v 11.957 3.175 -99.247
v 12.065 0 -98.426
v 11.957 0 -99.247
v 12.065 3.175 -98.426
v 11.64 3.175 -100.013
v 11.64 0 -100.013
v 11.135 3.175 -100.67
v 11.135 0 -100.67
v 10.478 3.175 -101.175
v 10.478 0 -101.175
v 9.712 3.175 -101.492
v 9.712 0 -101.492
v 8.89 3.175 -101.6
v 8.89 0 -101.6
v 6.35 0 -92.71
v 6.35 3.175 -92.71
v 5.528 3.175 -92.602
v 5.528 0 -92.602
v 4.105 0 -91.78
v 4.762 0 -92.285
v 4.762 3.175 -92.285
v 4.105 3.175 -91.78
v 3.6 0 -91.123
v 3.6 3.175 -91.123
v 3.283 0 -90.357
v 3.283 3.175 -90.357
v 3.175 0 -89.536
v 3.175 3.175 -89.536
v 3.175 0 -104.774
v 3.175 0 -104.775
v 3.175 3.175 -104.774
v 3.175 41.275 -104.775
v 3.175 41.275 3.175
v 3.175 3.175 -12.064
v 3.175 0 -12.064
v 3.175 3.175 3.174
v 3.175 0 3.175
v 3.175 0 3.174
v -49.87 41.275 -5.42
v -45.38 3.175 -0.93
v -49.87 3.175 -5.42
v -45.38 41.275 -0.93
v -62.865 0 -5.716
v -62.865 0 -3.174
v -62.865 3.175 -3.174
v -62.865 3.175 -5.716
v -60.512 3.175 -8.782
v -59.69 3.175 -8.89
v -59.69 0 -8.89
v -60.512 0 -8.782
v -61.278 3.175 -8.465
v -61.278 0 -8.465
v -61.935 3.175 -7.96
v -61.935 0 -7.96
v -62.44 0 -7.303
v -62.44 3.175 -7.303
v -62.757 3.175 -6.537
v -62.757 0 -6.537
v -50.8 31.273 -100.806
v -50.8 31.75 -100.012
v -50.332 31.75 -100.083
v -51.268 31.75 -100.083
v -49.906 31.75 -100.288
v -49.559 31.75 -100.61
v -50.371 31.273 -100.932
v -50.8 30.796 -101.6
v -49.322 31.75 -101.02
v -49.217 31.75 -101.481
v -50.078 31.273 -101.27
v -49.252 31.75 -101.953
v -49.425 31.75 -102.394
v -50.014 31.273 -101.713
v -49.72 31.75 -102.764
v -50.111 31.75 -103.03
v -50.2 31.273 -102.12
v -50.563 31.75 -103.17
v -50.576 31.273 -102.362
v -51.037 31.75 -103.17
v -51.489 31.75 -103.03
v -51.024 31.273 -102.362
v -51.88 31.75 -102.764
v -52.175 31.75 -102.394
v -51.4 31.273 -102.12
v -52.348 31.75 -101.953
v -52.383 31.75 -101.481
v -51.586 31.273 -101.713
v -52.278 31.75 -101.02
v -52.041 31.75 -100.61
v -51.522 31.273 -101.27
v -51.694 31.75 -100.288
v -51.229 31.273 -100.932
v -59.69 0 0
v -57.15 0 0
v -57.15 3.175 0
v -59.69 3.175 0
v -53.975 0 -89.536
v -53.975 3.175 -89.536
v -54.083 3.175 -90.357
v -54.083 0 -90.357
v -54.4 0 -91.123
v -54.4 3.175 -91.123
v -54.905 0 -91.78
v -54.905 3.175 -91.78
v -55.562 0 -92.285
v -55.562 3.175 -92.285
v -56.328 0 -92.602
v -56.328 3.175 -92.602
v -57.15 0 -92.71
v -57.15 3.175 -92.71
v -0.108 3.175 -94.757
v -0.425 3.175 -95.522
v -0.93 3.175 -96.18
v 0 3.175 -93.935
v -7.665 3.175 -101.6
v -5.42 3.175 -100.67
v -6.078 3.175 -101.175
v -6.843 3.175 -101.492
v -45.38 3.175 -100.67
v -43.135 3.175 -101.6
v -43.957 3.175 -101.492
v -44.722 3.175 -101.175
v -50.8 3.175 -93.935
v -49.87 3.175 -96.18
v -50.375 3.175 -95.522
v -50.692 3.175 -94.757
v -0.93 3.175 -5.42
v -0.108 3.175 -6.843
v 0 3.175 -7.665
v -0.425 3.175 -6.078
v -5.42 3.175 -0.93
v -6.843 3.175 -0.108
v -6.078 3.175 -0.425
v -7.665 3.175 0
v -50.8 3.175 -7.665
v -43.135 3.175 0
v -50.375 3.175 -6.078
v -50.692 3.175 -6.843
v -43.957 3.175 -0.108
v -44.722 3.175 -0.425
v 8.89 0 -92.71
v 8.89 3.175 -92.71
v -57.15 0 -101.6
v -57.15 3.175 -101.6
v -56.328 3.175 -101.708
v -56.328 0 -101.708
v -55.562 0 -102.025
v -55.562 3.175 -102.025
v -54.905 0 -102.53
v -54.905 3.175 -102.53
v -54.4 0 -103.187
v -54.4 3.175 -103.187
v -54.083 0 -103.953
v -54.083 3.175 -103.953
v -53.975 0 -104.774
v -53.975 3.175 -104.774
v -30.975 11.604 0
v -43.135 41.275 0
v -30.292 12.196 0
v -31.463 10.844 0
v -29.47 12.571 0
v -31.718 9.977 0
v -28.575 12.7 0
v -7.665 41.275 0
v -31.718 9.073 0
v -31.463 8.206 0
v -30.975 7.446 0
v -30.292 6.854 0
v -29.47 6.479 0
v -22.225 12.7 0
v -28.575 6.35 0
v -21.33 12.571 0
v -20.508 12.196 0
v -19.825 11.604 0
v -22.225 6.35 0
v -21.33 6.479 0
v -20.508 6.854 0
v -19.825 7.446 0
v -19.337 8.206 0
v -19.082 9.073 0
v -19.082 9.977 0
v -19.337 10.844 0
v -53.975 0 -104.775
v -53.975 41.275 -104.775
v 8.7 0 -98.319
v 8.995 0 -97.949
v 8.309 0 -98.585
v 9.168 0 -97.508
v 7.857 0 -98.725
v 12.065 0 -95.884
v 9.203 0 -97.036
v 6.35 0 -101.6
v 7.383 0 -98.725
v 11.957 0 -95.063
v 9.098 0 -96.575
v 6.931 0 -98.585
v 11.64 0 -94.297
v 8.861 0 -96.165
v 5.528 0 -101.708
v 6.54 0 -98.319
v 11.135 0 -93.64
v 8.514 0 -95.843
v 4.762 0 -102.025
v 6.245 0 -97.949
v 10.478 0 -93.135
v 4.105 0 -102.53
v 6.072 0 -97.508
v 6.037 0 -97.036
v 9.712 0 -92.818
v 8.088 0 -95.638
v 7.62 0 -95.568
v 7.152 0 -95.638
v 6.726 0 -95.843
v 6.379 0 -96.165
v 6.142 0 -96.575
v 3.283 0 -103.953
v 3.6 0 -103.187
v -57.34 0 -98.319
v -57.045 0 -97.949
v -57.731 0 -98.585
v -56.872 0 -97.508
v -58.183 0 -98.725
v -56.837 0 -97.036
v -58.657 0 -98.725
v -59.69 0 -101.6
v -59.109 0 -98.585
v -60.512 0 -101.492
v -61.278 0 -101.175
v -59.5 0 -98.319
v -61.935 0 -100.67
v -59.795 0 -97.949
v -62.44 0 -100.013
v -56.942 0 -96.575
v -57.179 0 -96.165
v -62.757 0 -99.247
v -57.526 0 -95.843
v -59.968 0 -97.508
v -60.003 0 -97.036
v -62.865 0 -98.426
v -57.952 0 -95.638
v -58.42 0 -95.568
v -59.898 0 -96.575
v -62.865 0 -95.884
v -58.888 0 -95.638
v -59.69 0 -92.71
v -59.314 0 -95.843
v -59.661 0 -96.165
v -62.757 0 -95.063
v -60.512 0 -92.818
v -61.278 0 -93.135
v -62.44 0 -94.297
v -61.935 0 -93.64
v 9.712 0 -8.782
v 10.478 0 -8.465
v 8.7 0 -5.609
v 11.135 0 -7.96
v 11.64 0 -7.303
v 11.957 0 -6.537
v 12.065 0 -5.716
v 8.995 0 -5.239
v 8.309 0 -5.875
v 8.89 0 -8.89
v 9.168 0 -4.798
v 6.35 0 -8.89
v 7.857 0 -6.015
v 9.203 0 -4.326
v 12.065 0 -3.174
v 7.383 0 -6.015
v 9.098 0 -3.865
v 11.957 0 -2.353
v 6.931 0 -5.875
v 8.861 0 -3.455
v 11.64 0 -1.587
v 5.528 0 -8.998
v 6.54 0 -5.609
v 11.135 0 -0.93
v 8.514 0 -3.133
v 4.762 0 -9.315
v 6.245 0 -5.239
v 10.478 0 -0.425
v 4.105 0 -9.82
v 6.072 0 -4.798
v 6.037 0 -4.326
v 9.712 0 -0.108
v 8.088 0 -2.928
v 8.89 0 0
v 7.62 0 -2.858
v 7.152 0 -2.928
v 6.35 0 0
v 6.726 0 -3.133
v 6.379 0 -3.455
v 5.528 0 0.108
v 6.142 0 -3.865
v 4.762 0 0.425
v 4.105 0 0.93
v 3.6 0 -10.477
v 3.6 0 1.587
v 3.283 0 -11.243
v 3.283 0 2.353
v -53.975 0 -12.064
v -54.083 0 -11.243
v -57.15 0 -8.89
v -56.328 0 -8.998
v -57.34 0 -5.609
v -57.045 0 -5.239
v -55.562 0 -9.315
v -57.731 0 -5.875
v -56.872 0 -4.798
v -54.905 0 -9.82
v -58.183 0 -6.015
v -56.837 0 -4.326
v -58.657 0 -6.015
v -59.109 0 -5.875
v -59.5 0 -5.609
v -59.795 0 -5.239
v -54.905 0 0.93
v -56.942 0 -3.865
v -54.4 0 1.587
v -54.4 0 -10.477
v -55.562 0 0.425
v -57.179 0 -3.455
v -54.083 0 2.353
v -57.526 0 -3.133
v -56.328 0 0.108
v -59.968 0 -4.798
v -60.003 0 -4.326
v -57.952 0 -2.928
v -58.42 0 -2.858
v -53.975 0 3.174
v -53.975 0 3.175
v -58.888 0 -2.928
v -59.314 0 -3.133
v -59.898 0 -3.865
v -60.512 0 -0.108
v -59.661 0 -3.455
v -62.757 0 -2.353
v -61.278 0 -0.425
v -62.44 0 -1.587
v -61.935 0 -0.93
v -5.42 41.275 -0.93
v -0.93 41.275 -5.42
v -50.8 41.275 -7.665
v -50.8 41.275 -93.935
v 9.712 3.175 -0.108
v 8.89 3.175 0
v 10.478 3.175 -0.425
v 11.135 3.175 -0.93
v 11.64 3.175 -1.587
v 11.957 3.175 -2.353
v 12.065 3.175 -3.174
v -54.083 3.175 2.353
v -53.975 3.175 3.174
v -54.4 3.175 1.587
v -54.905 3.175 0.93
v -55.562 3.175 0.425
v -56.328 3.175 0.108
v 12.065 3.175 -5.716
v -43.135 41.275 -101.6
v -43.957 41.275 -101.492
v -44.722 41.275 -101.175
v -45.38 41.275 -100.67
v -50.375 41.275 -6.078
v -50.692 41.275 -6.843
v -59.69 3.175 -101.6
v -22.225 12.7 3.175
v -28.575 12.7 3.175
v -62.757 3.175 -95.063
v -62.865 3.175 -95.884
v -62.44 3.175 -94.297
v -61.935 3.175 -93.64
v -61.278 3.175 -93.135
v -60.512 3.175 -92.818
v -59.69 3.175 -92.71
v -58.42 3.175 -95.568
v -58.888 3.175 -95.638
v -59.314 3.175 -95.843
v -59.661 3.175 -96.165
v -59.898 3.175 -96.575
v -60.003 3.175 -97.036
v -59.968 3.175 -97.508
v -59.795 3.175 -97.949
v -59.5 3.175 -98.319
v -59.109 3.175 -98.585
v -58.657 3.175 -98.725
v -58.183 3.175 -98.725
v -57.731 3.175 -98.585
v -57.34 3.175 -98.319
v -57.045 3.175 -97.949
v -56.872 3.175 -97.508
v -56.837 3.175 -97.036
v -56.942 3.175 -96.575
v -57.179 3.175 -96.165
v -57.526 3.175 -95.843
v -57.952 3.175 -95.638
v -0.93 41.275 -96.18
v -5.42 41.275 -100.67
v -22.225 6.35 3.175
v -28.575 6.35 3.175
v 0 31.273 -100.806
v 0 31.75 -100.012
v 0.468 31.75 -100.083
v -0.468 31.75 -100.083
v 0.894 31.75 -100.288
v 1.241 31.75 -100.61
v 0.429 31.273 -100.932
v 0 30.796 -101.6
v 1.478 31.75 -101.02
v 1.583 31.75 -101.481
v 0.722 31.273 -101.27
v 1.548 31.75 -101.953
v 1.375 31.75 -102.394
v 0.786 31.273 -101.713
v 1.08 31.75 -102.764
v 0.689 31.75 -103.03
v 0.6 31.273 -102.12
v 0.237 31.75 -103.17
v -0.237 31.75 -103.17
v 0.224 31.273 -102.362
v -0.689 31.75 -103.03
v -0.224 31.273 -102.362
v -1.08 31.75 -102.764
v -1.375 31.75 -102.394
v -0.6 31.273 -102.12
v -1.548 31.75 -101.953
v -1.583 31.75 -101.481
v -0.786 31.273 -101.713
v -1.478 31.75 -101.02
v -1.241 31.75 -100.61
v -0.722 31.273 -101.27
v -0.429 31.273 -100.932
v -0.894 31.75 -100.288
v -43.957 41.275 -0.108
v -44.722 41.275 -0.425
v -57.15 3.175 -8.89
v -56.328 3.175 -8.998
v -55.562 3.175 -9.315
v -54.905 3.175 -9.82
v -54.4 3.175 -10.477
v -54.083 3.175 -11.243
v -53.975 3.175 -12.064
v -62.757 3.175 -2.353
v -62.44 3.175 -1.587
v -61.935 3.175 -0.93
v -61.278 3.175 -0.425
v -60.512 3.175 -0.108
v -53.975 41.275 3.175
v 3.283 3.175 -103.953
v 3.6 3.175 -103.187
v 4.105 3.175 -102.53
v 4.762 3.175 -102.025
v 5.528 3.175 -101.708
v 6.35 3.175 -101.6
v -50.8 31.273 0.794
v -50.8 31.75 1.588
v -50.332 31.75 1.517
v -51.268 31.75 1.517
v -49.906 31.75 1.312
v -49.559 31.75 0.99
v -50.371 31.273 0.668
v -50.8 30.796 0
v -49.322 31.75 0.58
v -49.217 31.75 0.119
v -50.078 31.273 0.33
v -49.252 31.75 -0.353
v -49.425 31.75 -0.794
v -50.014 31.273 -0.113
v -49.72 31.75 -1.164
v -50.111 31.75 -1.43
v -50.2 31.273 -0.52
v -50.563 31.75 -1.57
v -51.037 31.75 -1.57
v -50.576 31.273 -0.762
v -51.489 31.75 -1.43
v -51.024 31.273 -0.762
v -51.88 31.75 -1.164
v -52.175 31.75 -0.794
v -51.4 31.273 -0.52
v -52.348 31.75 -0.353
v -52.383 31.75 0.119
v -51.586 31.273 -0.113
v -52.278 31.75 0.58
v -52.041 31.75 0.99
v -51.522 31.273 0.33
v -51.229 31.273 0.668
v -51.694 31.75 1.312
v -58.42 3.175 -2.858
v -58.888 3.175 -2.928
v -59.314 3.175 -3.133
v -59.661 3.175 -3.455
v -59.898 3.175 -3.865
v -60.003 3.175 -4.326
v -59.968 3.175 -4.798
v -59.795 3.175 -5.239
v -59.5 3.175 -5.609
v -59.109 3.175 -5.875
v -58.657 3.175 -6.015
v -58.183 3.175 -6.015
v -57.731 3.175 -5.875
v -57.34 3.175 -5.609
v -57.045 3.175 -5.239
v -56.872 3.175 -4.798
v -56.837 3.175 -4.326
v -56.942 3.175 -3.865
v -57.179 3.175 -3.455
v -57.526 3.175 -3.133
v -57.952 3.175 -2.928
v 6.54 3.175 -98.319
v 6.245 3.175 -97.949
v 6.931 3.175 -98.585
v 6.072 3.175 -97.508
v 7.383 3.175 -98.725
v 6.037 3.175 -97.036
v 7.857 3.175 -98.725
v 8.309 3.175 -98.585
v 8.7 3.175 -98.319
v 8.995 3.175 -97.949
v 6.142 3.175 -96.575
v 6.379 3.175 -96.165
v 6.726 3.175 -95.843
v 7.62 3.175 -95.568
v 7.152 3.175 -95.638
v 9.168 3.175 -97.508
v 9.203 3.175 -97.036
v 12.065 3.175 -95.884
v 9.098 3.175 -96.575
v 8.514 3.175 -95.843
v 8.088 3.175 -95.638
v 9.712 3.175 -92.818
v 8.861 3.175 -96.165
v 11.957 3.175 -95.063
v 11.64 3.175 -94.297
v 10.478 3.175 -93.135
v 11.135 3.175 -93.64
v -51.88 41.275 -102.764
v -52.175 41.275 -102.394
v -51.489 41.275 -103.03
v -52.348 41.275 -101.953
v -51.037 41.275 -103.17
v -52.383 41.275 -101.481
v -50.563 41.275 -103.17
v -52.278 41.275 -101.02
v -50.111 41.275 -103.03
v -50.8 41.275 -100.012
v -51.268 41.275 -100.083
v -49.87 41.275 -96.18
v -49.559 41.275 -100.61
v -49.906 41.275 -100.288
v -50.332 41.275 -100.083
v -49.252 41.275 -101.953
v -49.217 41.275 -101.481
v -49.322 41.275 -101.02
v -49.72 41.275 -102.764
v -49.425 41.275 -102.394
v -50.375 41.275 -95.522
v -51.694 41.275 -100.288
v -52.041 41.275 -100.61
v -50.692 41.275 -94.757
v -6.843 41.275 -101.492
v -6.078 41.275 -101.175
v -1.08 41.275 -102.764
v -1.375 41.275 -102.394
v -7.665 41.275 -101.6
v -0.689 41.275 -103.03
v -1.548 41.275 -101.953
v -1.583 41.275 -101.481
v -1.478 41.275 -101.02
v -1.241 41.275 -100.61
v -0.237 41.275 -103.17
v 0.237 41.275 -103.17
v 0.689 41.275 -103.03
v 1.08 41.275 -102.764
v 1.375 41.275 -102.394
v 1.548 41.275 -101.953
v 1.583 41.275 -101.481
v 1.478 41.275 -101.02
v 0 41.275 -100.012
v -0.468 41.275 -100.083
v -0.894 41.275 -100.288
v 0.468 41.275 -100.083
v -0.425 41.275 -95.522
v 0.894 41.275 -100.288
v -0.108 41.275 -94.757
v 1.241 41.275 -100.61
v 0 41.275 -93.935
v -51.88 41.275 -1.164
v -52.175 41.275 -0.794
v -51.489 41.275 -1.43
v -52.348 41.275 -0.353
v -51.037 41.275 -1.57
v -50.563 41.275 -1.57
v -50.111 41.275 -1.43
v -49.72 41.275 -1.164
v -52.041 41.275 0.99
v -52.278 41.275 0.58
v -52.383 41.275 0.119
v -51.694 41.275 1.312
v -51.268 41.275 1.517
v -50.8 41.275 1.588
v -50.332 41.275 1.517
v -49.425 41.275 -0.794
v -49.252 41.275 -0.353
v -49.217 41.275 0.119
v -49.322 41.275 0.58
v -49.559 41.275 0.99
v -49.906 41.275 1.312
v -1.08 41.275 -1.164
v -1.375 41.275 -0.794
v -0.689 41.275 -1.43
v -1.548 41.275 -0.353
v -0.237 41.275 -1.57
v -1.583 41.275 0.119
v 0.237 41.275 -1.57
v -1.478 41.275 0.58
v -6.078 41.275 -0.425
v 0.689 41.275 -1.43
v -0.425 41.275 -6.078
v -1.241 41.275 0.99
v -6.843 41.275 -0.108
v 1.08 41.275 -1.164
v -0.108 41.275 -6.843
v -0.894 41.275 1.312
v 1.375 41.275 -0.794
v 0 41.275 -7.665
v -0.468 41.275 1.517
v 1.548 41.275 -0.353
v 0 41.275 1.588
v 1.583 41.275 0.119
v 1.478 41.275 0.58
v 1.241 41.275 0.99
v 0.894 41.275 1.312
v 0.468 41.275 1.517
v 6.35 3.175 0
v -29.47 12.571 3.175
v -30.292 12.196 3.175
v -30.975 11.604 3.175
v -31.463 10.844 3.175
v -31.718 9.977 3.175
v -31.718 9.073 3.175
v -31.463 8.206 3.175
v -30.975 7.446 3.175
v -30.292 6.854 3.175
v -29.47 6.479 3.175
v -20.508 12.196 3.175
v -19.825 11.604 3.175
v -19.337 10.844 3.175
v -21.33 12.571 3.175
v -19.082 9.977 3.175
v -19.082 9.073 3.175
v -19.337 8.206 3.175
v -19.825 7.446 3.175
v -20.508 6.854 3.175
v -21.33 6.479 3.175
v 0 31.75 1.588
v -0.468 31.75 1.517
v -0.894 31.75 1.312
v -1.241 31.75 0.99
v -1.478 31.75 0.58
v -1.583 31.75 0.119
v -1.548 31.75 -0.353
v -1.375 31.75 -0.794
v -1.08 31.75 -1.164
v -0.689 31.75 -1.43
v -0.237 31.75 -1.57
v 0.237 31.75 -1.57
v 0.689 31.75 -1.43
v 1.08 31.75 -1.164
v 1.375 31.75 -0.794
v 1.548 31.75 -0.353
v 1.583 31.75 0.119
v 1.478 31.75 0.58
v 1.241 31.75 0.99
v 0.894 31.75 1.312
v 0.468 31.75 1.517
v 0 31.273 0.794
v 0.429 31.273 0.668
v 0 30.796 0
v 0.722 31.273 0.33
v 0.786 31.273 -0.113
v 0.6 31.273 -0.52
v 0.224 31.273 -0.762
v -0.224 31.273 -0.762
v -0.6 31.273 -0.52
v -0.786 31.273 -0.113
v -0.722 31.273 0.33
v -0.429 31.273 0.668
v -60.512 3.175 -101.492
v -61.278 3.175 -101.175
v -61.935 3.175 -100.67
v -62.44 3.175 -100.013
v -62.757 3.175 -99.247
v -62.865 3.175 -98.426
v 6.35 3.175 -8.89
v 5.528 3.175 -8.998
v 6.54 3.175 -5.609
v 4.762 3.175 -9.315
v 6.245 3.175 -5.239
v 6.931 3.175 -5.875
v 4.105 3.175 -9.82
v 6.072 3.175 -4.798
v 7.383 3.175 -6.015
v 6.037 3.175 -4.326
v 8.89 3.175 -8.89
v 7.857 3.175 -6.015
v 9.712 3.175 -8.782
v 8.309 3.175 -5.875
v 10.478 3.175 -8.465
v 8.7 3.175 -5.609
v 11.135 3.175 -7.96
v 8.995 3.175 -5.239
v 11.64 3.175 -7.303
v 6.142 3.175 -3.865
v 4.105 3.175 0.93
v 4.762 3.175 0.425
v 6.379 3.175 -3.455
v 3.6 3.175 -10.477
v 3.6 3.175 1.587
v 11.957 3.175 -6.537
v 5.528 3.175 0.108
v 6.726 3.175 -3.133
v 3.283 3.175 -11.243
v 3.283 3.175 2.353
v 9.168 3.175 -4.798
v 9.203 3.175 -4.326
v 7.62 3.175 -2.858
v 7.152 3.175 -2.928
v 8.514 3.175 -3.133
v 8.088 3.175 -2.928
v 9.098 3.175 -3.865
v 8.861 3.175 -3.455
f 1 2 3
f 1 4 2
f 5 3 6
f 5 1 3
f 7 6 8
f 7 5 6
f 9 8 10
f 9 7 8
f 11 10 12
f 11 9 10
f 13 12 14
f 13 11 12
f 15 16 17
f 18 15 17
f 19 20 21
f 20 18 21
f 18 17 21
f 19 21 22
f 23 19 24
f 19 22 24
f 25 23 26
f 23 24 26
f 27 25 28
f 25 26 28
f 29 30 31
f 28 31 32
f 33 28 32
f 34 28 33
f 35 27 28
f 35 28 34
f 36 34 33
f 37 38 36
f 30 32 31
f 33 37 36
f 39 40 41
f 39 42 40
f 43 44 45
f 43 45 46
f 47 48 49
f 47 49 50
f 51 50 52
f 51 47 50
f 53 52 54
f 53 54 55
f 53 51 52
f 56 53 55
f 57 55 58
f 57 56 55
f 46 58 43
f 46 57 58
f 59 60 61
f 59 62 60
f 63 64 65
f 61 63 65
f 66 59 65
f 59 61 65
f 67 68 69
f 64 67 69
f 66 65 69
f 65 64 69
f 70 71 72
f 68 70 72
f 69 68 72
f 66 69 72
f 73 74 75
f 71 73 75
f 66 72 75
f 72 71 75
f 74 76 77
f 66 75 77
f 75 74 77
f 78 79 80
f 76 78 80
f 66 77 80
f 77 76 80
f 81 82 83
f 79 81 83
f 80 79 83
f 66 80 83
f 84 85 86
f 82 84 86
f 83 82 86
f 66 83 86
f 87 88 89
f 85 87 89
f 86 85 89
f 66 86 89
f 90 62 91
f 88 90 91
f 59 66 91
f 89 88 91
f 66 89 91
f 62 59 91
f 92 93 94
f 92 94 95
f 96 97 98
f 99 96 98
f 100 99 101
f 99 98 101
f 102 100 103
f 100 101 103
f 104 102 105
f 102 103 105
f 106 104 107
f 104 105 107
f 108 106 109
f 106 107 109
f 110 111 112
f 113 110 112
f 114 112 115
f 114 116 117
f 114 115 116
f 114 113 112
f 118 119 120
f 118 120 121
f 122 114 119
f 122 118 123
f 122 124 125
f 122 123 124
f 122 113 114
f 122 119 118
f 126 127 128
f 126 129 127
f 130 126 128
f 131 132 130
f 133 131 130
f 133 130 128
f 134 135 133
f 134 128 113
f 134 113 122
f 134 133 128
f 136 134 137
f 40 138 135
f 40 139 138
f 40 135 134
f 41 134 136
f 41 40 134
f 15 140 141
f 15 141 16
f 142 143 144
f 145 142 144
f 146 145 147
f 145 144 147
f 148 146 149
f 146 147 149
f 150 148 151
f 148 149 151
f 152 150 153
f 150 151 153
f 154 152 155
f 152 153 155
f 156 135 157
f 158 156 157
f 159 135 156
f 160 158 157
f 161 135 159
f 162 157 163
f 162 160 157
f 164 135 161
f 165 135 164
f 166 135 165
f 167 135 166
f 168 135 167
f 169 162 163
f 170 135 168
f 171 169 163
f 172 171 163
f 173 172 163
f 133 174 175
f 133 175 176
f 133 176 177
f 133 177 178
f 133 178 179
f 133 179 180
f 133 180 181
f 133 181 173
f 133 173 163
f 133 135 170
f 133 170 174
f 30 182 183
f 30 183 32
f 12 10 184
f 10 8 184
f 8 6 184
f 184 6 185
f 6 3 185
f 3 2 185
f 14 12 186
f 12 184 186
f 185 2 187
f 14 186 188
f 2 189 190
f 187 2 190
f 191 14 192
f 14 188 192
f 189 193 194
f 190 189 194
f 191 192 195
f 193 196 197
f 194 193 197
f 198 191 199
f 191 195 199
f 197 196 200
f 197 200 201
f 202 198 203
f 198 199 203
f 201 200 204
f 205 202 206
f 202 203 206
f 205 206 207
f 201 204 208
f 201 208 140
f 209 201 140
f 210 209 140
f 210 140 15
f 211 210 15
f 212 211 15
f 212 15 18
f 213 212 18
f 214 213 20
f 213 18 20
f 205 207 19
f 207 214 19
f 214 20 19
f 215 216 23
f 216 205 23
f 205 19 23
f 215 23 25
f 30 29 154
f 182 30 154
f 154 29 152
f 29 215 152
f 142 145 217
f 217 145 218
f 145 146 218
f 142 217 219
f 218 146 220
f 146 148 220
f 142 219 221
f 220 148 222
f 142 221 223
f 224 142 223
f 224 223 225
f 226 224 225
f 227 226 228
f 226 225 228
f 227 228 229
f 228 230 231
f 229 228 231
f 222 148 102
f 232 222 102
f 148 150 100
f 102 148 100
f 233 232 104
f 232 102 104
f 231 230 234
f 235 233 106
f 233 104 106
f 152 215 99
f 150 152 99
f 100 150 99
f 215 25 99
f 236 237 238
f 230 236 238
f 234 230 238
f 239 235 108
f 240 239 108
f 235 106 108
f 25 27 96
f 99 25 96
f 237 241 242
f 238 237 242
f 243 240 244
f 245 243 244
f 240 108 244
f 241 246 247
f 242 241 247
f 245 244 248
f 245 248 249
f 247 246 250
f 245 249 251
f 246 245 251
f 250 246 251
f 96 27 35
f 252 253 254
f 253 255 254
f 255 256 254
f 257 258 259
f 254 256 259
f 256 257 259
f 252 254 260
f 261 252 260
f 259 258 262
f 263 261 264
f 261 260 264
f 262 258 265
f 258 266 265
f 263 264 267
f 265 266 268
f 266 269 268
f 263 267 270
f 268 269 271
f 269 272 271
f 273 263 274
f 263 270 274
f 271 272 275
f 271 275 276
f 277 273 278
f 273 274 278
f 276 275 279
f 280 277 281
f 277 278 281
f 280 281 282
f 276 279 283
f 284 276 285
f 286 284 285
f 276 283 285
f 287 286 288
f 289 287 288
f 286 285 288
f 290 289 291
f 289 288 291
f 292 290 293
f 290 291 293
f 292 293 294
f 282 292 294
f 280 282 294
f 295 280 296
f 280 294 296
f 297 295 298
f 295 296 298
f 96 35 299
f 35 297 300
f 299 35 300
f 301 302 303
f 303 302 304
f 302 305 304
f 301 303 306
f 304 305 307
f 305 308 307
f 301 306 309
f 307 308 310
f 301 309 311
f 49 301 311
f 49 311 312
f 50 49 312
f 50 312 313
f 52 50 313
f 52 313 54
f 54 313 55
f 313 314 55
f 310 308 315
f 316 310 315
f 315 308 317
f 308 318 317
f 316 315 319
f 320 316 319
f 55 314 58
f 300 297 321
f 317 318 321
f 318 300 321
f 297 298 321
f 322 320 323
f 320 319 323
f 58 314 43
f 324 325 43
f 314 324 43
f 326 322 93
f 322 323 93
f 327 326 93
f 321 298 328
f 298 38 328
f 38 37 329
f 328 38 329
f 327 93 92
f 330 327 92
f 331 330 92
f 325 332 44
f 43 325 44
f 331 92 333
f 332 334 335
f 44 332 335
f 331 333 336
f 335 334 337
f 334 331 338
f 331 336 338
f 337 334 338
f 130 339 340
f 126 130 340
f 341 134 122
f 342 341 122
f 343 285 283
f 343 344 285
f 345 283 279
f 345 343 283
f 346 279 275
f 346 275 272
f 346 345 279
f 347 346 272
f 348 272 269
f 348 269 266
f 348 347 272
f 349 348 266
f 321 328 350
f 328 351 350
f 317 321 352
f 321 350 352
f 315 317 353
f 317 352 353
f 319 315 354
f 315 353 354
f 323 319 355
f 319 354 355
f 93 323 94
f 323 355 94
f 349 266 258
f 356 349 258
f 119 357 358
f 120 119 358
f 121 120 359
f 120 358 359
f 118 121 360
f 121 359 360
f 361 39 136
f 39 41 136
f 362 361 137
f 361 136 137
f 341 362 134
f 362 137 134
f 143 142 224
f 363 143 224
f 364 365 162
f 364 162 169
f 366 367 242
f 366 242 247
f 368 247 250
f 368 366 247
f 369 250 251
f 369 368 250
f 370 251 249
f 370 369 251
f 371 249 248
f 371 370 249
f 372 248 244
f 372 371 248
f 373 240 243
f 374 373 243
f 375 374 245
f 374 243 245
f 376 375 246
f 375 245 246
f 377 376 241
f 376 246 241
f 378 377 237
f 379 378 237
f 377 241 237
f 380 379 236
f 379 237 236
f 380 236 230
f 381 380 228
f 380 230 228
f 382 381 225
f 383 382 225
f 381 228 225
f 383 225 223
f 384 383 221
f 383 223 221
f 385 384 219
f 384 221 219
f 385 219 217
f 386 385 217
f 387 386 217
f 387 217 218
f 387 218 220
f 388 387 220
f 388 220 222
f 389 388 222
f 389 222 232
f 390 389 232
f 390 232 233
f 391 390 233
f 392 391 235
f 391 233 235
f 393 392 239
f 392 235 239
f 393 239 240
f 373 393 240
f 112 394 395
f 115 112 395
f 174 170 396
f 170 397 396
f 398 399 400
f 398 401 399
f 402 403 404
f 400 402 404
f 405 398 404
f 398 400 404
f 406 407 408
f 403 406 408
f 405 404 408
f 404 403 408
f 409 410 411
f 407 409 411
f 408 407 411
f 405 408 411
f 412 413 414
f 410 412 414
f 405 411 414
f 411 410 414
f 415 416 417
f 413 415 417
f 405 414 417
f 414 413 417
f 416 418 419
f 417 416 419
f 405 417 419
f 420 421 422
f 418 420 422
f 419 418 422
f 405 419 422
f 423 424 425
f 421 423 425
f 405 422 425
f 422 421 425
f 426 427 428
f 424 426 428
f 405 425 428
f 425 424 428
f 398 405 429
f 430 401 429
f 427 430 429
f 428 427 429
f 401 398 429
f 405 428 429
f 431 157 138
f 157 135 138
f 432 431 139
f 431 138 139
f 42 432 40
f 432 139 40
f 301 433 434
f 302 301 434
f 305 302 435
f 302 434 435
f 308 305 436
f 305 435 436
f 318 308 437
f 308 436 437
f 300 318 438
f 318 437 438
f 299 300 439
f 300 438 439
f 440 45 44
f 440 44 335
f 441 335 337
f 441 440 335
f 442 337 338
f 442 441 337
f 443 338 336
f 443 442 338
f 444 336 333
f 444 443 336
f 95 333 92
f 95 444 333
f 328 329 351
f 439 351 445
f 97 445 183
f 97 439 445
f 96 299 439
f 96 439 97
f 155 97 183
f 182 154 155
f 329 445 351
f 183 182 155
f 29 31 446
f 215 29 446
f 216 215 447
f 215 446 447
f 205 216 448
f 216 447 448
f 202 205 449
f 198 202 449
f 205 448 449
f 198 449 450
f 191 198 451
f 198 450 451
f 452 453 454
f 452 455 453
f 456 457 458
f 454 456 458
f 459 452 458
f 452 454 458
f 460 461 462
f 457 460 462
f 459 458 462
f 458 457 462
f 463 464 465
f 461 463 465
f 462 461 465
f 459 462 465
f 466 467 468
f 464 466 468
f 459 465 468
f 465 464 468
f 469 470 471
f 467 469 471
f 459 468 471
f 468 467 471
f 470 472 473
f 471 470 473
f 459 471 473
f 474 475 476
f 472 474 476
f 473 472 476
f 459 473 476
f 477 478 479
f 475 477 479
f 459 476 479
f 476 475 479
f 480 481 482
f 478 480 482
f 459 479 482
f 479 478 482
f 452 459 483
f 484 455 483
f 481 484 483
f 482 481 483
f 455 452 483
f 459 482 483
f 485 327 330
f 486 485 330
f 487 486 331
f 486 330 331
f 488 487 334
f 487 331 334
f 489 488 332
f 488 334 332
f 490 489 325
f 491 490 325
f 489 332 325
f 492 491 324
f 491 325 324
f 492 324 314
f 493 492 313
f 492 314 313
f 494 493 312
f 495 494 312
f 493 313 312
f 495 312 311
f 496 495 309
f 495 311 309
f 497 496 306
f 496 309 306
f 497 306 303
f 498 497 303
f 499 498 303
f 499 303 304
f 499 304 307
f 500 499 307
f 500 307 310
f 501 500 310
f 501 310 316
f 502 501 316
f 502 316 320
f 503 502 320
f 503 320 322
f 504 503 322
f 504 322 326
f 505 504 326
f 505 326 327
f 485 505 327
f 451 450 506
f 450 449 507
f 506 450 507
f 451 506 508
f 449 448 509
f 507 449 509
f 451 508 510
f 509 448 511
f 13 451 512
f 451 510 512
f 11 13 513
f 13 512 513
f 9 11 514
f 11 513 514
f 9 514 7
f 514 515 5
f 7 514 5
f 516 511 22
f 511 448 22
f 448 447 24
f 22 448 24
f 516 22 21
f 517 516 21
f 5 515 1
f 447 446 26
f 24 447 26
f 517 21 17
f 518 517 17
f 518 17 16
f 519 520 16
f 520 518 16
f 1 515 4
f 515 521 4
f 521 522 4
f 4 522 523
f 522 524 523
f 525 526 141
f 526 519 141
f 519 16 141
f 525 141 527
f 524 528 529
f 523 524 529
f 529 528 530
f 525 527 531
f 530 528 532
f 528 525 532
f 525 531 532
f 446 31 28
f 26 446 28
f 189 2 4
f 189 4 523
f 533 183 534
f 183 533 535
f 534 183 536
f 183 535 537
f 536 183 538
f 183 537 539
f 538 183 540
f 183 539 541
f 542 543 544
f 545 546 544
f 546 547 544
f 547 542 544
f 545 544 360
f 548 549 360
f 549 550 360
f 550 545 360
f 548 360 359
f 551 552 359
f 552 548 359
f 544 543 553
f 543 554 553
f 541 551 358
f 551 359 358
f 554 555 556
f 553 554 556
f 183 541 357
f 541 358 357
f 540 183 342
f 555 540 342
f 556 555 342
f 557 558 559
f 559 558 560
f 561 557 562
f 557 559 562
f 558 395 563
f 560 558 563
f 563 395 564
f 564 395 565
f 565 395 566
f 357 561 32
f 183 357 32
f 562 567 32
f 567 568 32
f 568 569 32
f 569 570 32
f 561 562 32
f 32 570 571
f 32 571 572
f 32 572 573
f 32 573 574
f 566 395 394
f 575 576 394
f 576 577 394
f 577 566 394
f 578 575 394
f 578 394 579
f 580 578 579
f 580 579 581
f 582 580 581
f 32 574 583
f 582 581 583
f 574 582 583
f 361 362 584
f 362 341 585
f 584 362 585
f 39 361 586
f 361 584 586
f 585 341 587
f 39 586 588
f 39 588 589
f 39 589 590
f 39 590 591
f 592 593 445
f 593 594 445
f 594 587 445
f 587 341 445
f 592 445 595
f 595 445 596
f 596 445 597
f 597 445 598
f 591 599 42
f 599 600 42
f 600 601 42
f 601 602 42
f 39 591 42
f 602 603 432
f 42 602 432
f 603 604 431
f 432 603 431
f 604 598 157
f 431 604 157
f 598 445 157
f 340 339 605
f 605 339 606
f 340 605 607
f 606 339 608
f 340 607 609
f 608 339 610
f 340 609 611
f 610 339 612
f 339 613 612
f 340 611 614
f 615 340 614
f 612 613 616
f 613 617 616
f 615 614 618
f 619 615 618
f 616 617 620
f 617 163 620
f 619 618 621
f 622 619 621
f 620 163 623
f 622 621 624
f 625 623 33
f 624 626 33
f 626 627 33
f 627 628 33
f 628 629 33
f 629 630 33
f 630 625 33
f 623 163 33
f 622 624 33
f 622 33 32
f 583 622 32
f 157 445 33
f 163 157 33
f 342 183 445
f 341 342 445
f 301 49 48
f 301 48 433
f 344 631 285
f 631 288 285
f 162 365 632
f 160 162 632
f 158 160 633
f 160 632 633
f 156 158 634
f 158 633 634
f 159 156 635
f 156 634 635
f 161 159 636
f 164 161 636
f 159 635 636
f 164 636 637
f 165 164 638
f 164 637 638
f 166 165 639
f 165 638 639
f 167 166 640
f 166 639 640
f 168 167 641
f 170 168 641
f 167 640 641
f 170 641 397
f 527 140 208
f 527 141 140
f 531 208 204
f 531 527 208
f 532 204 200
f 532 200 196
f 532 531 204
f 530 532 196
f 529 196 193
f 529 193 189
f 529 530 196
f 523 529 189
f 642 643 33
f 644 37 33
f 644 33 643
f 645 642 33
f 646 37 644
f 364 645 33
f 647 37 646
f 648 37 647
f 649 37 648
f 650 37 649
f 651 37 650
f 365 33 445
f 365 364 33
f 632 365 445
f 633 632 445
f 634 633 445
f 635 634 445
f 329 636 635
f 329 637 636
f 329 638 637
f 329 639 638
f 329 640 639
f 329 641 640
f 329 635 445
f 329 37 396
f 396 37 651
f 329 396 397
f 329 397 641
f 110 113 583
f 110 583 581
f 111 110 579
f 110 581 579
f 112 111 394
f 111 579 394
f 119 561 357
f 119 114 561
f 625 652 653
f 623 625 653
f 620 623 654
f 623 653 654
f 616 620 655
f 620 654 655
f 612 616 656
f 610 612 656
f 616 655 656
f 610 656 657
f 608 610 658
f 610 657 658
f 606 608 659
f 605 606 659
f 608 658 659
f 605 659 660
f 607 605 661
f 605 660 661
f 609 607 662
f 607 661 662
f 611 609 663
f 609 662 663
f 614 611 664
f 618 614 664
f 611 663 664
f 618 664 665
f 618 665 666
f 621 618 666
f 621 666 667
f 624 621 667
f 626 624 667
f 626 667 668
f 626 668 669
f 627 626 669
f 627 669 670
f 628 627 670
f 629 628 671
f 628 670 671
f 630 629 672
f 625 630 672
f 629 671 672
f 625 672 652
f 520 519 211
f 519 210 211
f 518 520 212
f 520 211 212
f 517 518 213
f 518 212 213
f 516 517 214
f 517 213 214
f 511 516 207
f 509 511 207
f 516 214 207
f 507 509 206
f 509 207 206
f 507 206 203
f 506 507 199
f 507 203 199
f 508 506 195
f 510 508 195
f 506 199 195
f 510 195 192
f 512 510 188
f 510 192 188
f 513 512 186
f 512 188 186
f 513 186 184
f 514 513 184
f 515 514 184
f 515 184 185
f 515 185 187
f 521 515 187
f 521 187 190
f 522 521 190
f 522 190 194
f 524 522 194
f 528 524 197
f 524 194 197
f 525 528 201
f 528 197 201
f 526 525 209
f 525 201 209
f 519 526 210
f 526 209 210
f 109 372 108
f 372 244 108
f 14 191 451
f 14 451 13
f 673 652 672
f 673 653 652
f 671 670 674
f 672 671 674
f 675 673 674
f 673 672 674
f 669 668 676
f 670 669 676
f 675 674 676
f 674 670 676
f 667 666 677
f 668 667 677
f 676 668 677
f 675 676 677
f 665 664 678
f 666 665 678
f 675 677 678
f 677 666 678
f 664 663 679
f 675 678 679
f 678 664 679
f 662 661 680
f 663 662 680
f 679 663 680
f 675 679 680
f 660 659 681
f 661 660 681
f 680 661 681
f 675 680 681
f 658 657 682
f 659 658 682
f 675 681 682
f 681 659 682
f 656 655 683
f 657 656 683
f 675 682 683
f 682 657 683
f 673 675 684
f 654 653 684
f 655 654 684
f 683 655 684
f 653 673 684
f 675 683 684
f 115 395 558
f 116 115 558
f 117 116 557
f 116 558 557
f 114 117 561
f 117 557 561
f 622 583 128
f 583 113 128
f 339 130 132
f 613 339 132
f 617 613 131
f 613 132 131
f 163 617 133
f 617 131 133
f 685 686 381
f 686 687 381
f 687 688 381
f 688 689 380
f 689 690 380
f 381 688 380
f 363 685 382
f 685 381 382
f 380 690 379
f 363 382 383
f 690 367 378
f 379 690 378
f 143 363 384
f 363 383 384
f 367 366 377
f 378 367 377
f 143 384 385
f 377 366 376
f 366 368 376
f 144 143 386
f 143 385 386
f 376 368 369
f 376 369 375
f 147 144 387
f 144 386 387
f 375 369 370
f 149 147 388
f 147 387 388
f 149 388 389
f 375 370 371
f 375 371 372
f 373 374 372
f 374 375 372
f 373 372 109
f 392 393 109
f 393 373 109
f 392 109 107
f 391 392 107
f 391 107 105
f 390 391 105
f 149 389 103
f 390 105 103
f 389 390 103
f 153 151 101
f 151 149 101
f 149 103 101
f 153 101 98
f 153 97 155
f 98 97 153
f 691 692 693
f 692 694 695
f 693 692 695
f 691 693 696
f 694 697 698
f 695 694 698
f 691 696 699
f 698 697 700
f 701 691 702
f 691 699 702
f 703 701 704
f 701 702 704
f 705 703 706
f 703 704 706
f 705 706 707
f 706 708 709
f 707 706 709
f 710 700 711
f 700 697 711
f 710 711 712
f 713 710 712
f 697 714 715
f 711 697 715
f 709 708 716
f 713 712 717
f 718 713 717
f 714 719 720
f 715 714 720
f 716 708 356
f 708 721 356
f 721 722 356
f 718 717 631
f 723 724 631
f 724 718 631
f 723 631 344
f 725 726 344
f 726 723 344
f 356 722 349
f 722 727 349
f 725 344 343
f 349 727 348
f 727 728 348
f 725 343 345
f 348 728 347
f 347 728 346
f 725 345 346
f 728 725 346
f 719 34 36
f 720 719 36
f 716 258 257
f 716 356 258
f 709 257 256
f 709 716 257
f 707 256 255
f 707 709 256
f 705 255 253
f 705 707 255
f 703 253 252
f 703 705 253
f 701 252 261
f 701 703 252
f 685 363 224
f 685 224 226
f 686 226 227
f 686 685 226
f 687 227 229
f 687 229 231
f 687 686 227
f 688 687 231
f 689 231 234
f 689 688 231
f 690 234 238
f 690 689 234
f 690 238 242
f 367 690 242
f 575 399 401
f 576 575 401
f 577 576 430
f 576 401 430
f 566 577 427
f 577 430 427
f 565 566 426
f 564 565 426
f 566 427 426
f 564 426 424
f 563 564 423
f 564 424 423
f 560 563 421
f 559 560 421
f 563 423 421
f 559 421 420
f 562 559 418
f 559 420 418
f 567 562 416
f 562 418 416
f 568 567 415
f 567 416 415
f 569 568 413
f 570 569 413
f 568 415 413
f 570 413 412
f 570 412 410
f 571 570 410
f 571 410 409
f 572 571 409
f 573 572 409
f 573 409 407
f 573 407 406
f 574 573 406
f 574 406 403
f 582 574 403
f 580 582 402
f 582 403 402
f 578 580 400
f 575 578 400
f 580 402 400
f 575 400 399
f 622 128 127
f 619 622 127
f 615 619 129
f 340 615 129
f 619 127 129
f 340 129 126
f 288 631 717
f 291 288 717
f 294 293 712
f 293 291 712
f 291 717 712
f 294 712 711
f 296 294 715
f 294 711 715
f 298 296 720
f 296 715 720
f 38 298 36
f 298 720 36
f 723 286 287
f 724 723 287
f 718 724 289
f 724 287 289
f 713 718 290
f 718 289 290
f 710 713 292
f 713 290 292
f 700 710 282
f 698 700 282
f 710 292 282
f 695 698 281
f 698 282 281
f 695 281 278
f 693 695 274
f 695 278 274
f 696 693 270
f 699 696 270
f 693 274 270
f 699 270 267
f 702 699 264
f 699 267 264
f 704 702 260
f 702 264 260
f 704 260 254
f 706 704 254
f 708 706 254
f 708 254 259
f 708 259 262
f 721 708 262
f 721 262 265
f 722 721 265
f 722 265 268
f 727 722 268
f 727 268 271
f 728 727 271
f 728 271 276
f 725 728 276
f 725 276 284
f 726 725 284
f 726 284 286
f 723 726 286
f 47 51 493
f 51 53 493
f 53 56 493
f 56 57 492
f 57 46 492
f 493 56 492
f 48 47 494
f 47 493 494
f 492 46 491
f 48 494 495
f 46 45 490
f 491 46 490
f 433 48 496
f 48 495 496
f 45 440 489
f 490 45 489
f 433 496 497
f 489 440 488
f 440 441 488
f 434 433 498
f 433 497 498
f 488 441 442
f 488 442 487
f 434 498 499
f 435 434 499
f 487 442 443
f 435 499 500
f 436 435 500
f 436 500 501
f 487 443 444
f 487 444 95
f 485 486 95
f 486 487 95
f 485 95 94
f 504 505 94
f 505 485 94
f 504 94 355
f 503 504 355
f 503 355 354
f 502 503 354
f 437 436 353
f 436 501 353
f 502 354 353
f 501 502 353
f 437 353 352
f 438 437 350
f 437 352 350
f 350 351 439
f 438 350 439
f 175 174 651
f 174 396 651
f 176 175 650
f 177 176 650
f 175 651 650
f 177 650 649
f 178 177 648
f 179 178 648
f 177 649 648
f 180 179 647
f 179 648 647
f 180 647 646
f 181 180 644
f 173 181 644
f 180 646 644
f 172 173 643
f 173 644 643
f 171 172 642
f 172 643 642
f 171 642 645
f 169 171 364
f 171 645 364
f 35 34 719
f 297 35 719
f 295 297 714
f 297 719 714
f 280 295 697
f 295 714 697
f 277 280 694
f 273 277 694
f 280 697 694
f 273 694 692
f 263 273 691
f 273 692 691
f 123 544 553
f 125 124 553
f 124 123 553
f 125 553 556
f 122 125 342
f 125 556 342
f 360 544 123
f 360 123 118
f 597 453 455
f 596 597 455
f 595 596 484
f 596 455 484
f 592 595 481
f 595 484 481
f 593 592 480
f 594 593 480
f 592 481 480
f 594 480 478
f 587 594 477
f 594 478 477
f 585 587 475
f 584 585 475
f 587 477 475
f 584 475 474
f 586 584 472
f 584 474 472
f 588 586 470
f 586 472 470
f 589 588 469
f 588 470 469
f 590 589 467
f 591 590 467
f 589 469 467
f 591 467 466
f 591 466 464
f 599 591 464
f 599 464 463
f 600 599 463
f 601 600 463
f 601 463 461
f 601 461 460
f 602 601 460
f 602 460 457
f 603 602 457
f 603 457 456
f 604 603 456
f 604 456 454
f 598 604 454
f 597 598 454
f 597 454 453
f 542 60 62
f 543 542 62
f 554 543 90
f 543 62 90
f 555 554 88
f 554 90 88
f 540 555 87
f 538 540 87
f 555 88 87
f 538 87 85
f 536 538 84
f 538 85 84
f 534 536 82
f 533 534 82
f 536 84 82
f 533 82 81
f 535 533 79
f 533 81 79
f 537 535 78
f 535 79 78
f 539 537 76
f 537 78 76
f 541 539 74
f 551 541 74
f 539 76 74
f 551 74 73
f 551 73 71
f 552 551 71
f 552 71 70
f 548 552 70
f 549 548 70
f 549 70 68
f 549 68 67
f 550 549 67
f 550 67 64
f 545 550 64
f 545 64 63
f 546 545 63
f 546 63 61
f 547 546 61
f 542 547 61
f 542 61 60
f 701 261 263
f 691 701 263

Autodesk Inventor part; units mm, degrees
ref_plane "YZ Plane" through (0, 0, 0) normal (1, 0, 0) x (0, 1, 0)
ref_plane "XZ Plane" through (0, 0, 0) normal (0, 1, 0) x (-1, 0, 0)
ref_plane "XY Plane" through (0, 0, 0) normal (0, 0, 1) x (1, 0, 0)
sketch "Sketch1" plane through (0, 0, 0) normal (0, 1, 0) x (-1, 0, 0)
  line L0 (0, 0) -> (50.8, 0)
  line L1 (50.8, 0) -> (50.8, -101.6)
  line L2 (50.8, -101.6) -> (0, -101.6)
  line L3 (0, -101.6) -> (0, 0)
  dimension "d0" = 50.8
  dimension "d1" = 101.6
extrude "Extrusion1" add sketch "Sketch1" along normal blind 3.175
sketch "Sketch2" plane through (0, 0, 0) normal (0, -1, 0) x (1, 0, 0)
  line L0 (-50.8, 0) -> (0, 0) projected
  line L1 (0, 0) -> (3.175, 0)
  line L2 (3.175, 0) -> (3.175, 3.175)
  line L3 (3.175, 3.175) -> (0, 3.175)
  line L4 (0, 3.175) -> (0, 0)
  line L5 (0, -101.6) -> (-50.8, -101.6) projected
  line L6 (-50.8, -101.6) -> (-53.975, -101.6)
  line L7 (-53.975, -101.6) -> (-53.975, -104.775)
  line L8 (-53.975, -104.775) -> (-50.8, -104.775)
  line L9 (-50.8, -104.775) -> (-50.8, -101.6)
  line L10 (3.175, 3.175) -> (-53.975, 3.175)
  line L11 (-53.975, 3.175) -> (-53.975, -104.775)
  line L12 (-53.975, -104.775) -> (3.175, -104.775)
  line L13 (3.175, -104.775) -> (3.175, 3.175)
  line L14 (-50.8, -101.6) -> (0, -101.6)
  line L15 (0, -101.6) -> (0, 0)
  line L16 (0, 0) -> (-50.8, 0)
  line L17 (-50.8, 0) -> (-50.8, -101.6)
  dimension "d4" = 3.175
  dimension "d5" = 3.175
  dimension "d6" = 3.175
  dimension "d7" = 3.175
extrude "Extrusion2" add sketch "Sketch2" against normal blind 41.275 contours L17 L6 L11 L10 L4 L0 | L4 L3 L2 L1 | L1 L13 L12 L9 L5 L15 | L9 L8 L7 L6
sketch "Sketch3" plane through (0, 0, 0) normal (0, -1, 0) x (1, 0, 0)
  line L0 (0, -101.6) -> (0, 0) projected
  line L1 (3.175, 3.175) -> (3.175, -104.775) projected
  line L2 (0, 0) -> (3.175, 0)
  line L3 (3.175, 0) -> (12.065, 0)
  line L4 (12.065, 0) -> (12.065, -8.89)
  line L5 (12.065, -8.89) -> (3.175, -8.89)
  line L6 (3.175, -8.89) -> (3.175, 0)
  line L7 (-53.975, -104.775) -> (-53.975, 3.175) projected
  line L8 (-53.975, 0) -> (-62.865, 0)
  line L9 (-62.865, 0) -> (-62.865, -8.89)
  line L10 (-62.865, -8.89) -> (-53.975, -8.89)
  line L11 (-53.975, -8.89) -> (-53.975, 0)
  line L12 (-53.975, -101.6) -> (-62.865, -101.6)
  line L13 (-62.865, -101.6) -> (-62.865, -92.71)
  line L14 (-62.865, -92.71) -> (-53.975, -92.71)
  line L15 (-53.975, -92.71) -> (-53.975, -101.6)
  line L16 (3.175, -101.6) -> (12.065, -101.6)
  line L17 (12.065, -101.6) -> (12.065, -92.71)
  line L18 (12.065, -92.71) -> (3.175, -92.71)
  line L19 (3.175, -92.71) -> (3.175, -101.6)
  dimension "d11" = 8.89
  dimension "d12" = 8.89
  dimension "d13" = 8.89
  dimension "d14" = 8.89
  dimension "d15" = 8.89
  dimension "d16" = 8.89
  dimension "d17" = 8.89
  dimension "d18" = 8.89
extrude "Extrusion3" add sketch "Sketch3" against normal blind 3.175
fillet "Fillet1" radius 3.175 16 edges at (3.175, 1.5875, 0) (12.065, 1.5875, 0) (12.065, 1.5875, -8.89) (3.175, 1.5875, -8.89) (12.065, 1.5875, -92.71) (3.175, 1.5875, -92.71) (12.065, 1.5875, -101.6) (3.175, 1.5875, -101.6) (-53.975, 1.5875, -101.6) (-62.865, 1.5875, -101.6) (-62.865, 1.5875, -92.71) (-53.975, 1.5875, -92.71) (-53.975, 1.5875, 0) (-62.865, 1.5875, 0) (-62.865, 1.5875, -8.89) (-53.975, 1.5875, -8.89)
sketch "Sketch4" plane through (0, 3.175, 0) normal (0, 1, 0) x (1, 0, 0)
  line L0 (-59.69, 8.89) -> (-57.15, 8.89) construction
  line L1 (-58.42, 8.89) -> (-58.42, 0) construction
  line L2 (-59.69, 0) -> (-57.15, 0) construction
  line L3 (6.35, 8.89) -> (8.89, 8.89) construction
  line L4 (7.62, 8.89) -> (7.62, 0) construction
  line L5 (8.89, 0) -> (6.35, 0) construction
  line L6 (8.89, 101.6) -> (6.35, 101.6) construction
  line L7 (7.62, 101.6) -> (7.62, 92.71) construction
  line L8 (6.35, 92.71) -> (8.89, 92.71) construction
  line L9 (-57.15, 101.6) -> (-59.69, 101.6) construction
  line L10 (-58.42, 101.6) -> (-58.42, 92.71) construction
  line L11 (-59.69, 92.71) -> (-57.15, 92.71) construction
  point P0 (0, 0)
  point P1 (-58.42, 97.155)
  point P2 (7.62, 97.155)
  point P3 (7.62, 4.445)
  point P4 (-58.42, 4.445)
hole "Hole1" at (-58.42, 3.175, -97.155) at (7.62, 3.175, -97.155) at (7.62, 3.175, -4.445) at (-58.42, 3.175, -4.445) direction (0, -1, 0) diameter 3.175 depth 25.4 tip angle 118
sketch "Sketch5" plane through (0, 41.275, 0) normal (0, 1, 0) x (1, 0, 0)
  line L0 (-53.975, 104.775) -> (3.175, 104.775) projected
  line L1 (3.175, 104.775) -> (-9.525, 104.775)
  arc A0 (3.175, 104.775) -> (6.35, 101.6) centre (6.35, 104.775) ccw projected
  line L2 (3.175, 104.775) -> (3.175, 92.075)
  line L3 (3.175, 92.075) -> (-9.525, 104.775)
  line L4 (3.175, -3.175) -> (-53.975, -3.175) projected
  line L5 (3.175, -3.175) -> (3.175, 9.525)
  line L6 (3.175, -3.175) -> (3.175, 12.065) projected
  line L7 (3.175, -3.175) -> (-9.525, -3.175)
  line L8 (-9.525, -3.175) -> (3.175, 9.525)
  line L9 (-25.4, 104.775) -> (-25.4, -3.175) construction
  line L10 (3.175, 104.775) -> (-53.975, 104.775)
  line L11 (-53.975, 104.775) -> (-41.275, 104.775)
  line L12 (-53.975, 104.775) -> (-53.975, 92.075)
  line L13 (-53.975, 92.075) -> (-41.275, 104.775)
  line L14 (-53.975, -3.175) -> (3.175, -3.175)
  line L15 (-53.975, -3.175) -> (-53.975, 9.525)
  line L16 (-53.975, -3.175) -> (-41.275, -3.175)
  line L17 (-41.275, -3.175) -> (-53.975, 9.525)
  point P0 (0, 0)
  dimension "d29" = 12.7
  dimension "d30" = 12.7
  dimension "d31" = 12.7
  dimension "d32" = 12.7
extrude "Extrusion4" add sketch "Sketch5" against normal blind 39.37
fillet "Fillet2" radius 3.175 8 edges at (-6.35, 22.225, -101.6) (0, 22.225, -95.25) (-44.45, 22.225, -101.6) (-50.8, 22.225, -95.25) (-50.8, 22.225, -6.35) (-44.45, 22.225, 0) (-6.35, 22.225, 0) (0, 22.225, -6.35)
sketch "Sketch6" plane through (0, 41.275, 0) normal (0, 1, 0) x (1, 0, 0)
  line L0 (-50.8, 93.9349) -> (-50.8, 7.6651) projected
  line L1 (0, 0) -> (0, 93.9349) projected
  point P0 (-50.8, 0)
  point P1 (-50.8, 101.6)
  point P2 (-50.8, 101.6)
  point P3 (0, 101.6)
hole "Hole2" at (0, 41.275, 0) at (-50.8, 41.275, 0) at (-50.8, 41.275, -101.6) at (0, 41.275, -101.6) direction (0, -1, 0) diameter 3.175 depth 9.525 tip angle 118
sketch "Sketch7" plane through (-53.975, 41.275, 3.175) normal (0, 0, 1) x (1, 0, 0)
  line L0 (46.3099, -38.1) -> (10.8401, -38.1) construction
  line L1 (28.575, -38.1) -> (28.575, -31.75) construction
  line L2 (28.575, -31.75) -> (25.4, -31.75) construction
  line L3 (28.575, -31.75) -> (31.75, -31.75) construction
  circle A0 centre (25.4, -31.75) radius 3.175
  circle A1 centre (31.75, -31.75) radius 3.175
  line L4 (25.4, -28.575) -> (31.75, -28.575)
  line L5 (25.4, -34.925) -> (31.75, -34.925)
  point P0 (53.975, -41.275)
  dimension "d49" = 6.35
  dimension "d50" = 3.175
  dimension "d51" = 3.175
  dimension "d52" = 6.35
  dimension "d53" = 6.35
extrude "Extrusion5" cut sketch "Sketch7" against normal blind 25.4
properties part number "box"
